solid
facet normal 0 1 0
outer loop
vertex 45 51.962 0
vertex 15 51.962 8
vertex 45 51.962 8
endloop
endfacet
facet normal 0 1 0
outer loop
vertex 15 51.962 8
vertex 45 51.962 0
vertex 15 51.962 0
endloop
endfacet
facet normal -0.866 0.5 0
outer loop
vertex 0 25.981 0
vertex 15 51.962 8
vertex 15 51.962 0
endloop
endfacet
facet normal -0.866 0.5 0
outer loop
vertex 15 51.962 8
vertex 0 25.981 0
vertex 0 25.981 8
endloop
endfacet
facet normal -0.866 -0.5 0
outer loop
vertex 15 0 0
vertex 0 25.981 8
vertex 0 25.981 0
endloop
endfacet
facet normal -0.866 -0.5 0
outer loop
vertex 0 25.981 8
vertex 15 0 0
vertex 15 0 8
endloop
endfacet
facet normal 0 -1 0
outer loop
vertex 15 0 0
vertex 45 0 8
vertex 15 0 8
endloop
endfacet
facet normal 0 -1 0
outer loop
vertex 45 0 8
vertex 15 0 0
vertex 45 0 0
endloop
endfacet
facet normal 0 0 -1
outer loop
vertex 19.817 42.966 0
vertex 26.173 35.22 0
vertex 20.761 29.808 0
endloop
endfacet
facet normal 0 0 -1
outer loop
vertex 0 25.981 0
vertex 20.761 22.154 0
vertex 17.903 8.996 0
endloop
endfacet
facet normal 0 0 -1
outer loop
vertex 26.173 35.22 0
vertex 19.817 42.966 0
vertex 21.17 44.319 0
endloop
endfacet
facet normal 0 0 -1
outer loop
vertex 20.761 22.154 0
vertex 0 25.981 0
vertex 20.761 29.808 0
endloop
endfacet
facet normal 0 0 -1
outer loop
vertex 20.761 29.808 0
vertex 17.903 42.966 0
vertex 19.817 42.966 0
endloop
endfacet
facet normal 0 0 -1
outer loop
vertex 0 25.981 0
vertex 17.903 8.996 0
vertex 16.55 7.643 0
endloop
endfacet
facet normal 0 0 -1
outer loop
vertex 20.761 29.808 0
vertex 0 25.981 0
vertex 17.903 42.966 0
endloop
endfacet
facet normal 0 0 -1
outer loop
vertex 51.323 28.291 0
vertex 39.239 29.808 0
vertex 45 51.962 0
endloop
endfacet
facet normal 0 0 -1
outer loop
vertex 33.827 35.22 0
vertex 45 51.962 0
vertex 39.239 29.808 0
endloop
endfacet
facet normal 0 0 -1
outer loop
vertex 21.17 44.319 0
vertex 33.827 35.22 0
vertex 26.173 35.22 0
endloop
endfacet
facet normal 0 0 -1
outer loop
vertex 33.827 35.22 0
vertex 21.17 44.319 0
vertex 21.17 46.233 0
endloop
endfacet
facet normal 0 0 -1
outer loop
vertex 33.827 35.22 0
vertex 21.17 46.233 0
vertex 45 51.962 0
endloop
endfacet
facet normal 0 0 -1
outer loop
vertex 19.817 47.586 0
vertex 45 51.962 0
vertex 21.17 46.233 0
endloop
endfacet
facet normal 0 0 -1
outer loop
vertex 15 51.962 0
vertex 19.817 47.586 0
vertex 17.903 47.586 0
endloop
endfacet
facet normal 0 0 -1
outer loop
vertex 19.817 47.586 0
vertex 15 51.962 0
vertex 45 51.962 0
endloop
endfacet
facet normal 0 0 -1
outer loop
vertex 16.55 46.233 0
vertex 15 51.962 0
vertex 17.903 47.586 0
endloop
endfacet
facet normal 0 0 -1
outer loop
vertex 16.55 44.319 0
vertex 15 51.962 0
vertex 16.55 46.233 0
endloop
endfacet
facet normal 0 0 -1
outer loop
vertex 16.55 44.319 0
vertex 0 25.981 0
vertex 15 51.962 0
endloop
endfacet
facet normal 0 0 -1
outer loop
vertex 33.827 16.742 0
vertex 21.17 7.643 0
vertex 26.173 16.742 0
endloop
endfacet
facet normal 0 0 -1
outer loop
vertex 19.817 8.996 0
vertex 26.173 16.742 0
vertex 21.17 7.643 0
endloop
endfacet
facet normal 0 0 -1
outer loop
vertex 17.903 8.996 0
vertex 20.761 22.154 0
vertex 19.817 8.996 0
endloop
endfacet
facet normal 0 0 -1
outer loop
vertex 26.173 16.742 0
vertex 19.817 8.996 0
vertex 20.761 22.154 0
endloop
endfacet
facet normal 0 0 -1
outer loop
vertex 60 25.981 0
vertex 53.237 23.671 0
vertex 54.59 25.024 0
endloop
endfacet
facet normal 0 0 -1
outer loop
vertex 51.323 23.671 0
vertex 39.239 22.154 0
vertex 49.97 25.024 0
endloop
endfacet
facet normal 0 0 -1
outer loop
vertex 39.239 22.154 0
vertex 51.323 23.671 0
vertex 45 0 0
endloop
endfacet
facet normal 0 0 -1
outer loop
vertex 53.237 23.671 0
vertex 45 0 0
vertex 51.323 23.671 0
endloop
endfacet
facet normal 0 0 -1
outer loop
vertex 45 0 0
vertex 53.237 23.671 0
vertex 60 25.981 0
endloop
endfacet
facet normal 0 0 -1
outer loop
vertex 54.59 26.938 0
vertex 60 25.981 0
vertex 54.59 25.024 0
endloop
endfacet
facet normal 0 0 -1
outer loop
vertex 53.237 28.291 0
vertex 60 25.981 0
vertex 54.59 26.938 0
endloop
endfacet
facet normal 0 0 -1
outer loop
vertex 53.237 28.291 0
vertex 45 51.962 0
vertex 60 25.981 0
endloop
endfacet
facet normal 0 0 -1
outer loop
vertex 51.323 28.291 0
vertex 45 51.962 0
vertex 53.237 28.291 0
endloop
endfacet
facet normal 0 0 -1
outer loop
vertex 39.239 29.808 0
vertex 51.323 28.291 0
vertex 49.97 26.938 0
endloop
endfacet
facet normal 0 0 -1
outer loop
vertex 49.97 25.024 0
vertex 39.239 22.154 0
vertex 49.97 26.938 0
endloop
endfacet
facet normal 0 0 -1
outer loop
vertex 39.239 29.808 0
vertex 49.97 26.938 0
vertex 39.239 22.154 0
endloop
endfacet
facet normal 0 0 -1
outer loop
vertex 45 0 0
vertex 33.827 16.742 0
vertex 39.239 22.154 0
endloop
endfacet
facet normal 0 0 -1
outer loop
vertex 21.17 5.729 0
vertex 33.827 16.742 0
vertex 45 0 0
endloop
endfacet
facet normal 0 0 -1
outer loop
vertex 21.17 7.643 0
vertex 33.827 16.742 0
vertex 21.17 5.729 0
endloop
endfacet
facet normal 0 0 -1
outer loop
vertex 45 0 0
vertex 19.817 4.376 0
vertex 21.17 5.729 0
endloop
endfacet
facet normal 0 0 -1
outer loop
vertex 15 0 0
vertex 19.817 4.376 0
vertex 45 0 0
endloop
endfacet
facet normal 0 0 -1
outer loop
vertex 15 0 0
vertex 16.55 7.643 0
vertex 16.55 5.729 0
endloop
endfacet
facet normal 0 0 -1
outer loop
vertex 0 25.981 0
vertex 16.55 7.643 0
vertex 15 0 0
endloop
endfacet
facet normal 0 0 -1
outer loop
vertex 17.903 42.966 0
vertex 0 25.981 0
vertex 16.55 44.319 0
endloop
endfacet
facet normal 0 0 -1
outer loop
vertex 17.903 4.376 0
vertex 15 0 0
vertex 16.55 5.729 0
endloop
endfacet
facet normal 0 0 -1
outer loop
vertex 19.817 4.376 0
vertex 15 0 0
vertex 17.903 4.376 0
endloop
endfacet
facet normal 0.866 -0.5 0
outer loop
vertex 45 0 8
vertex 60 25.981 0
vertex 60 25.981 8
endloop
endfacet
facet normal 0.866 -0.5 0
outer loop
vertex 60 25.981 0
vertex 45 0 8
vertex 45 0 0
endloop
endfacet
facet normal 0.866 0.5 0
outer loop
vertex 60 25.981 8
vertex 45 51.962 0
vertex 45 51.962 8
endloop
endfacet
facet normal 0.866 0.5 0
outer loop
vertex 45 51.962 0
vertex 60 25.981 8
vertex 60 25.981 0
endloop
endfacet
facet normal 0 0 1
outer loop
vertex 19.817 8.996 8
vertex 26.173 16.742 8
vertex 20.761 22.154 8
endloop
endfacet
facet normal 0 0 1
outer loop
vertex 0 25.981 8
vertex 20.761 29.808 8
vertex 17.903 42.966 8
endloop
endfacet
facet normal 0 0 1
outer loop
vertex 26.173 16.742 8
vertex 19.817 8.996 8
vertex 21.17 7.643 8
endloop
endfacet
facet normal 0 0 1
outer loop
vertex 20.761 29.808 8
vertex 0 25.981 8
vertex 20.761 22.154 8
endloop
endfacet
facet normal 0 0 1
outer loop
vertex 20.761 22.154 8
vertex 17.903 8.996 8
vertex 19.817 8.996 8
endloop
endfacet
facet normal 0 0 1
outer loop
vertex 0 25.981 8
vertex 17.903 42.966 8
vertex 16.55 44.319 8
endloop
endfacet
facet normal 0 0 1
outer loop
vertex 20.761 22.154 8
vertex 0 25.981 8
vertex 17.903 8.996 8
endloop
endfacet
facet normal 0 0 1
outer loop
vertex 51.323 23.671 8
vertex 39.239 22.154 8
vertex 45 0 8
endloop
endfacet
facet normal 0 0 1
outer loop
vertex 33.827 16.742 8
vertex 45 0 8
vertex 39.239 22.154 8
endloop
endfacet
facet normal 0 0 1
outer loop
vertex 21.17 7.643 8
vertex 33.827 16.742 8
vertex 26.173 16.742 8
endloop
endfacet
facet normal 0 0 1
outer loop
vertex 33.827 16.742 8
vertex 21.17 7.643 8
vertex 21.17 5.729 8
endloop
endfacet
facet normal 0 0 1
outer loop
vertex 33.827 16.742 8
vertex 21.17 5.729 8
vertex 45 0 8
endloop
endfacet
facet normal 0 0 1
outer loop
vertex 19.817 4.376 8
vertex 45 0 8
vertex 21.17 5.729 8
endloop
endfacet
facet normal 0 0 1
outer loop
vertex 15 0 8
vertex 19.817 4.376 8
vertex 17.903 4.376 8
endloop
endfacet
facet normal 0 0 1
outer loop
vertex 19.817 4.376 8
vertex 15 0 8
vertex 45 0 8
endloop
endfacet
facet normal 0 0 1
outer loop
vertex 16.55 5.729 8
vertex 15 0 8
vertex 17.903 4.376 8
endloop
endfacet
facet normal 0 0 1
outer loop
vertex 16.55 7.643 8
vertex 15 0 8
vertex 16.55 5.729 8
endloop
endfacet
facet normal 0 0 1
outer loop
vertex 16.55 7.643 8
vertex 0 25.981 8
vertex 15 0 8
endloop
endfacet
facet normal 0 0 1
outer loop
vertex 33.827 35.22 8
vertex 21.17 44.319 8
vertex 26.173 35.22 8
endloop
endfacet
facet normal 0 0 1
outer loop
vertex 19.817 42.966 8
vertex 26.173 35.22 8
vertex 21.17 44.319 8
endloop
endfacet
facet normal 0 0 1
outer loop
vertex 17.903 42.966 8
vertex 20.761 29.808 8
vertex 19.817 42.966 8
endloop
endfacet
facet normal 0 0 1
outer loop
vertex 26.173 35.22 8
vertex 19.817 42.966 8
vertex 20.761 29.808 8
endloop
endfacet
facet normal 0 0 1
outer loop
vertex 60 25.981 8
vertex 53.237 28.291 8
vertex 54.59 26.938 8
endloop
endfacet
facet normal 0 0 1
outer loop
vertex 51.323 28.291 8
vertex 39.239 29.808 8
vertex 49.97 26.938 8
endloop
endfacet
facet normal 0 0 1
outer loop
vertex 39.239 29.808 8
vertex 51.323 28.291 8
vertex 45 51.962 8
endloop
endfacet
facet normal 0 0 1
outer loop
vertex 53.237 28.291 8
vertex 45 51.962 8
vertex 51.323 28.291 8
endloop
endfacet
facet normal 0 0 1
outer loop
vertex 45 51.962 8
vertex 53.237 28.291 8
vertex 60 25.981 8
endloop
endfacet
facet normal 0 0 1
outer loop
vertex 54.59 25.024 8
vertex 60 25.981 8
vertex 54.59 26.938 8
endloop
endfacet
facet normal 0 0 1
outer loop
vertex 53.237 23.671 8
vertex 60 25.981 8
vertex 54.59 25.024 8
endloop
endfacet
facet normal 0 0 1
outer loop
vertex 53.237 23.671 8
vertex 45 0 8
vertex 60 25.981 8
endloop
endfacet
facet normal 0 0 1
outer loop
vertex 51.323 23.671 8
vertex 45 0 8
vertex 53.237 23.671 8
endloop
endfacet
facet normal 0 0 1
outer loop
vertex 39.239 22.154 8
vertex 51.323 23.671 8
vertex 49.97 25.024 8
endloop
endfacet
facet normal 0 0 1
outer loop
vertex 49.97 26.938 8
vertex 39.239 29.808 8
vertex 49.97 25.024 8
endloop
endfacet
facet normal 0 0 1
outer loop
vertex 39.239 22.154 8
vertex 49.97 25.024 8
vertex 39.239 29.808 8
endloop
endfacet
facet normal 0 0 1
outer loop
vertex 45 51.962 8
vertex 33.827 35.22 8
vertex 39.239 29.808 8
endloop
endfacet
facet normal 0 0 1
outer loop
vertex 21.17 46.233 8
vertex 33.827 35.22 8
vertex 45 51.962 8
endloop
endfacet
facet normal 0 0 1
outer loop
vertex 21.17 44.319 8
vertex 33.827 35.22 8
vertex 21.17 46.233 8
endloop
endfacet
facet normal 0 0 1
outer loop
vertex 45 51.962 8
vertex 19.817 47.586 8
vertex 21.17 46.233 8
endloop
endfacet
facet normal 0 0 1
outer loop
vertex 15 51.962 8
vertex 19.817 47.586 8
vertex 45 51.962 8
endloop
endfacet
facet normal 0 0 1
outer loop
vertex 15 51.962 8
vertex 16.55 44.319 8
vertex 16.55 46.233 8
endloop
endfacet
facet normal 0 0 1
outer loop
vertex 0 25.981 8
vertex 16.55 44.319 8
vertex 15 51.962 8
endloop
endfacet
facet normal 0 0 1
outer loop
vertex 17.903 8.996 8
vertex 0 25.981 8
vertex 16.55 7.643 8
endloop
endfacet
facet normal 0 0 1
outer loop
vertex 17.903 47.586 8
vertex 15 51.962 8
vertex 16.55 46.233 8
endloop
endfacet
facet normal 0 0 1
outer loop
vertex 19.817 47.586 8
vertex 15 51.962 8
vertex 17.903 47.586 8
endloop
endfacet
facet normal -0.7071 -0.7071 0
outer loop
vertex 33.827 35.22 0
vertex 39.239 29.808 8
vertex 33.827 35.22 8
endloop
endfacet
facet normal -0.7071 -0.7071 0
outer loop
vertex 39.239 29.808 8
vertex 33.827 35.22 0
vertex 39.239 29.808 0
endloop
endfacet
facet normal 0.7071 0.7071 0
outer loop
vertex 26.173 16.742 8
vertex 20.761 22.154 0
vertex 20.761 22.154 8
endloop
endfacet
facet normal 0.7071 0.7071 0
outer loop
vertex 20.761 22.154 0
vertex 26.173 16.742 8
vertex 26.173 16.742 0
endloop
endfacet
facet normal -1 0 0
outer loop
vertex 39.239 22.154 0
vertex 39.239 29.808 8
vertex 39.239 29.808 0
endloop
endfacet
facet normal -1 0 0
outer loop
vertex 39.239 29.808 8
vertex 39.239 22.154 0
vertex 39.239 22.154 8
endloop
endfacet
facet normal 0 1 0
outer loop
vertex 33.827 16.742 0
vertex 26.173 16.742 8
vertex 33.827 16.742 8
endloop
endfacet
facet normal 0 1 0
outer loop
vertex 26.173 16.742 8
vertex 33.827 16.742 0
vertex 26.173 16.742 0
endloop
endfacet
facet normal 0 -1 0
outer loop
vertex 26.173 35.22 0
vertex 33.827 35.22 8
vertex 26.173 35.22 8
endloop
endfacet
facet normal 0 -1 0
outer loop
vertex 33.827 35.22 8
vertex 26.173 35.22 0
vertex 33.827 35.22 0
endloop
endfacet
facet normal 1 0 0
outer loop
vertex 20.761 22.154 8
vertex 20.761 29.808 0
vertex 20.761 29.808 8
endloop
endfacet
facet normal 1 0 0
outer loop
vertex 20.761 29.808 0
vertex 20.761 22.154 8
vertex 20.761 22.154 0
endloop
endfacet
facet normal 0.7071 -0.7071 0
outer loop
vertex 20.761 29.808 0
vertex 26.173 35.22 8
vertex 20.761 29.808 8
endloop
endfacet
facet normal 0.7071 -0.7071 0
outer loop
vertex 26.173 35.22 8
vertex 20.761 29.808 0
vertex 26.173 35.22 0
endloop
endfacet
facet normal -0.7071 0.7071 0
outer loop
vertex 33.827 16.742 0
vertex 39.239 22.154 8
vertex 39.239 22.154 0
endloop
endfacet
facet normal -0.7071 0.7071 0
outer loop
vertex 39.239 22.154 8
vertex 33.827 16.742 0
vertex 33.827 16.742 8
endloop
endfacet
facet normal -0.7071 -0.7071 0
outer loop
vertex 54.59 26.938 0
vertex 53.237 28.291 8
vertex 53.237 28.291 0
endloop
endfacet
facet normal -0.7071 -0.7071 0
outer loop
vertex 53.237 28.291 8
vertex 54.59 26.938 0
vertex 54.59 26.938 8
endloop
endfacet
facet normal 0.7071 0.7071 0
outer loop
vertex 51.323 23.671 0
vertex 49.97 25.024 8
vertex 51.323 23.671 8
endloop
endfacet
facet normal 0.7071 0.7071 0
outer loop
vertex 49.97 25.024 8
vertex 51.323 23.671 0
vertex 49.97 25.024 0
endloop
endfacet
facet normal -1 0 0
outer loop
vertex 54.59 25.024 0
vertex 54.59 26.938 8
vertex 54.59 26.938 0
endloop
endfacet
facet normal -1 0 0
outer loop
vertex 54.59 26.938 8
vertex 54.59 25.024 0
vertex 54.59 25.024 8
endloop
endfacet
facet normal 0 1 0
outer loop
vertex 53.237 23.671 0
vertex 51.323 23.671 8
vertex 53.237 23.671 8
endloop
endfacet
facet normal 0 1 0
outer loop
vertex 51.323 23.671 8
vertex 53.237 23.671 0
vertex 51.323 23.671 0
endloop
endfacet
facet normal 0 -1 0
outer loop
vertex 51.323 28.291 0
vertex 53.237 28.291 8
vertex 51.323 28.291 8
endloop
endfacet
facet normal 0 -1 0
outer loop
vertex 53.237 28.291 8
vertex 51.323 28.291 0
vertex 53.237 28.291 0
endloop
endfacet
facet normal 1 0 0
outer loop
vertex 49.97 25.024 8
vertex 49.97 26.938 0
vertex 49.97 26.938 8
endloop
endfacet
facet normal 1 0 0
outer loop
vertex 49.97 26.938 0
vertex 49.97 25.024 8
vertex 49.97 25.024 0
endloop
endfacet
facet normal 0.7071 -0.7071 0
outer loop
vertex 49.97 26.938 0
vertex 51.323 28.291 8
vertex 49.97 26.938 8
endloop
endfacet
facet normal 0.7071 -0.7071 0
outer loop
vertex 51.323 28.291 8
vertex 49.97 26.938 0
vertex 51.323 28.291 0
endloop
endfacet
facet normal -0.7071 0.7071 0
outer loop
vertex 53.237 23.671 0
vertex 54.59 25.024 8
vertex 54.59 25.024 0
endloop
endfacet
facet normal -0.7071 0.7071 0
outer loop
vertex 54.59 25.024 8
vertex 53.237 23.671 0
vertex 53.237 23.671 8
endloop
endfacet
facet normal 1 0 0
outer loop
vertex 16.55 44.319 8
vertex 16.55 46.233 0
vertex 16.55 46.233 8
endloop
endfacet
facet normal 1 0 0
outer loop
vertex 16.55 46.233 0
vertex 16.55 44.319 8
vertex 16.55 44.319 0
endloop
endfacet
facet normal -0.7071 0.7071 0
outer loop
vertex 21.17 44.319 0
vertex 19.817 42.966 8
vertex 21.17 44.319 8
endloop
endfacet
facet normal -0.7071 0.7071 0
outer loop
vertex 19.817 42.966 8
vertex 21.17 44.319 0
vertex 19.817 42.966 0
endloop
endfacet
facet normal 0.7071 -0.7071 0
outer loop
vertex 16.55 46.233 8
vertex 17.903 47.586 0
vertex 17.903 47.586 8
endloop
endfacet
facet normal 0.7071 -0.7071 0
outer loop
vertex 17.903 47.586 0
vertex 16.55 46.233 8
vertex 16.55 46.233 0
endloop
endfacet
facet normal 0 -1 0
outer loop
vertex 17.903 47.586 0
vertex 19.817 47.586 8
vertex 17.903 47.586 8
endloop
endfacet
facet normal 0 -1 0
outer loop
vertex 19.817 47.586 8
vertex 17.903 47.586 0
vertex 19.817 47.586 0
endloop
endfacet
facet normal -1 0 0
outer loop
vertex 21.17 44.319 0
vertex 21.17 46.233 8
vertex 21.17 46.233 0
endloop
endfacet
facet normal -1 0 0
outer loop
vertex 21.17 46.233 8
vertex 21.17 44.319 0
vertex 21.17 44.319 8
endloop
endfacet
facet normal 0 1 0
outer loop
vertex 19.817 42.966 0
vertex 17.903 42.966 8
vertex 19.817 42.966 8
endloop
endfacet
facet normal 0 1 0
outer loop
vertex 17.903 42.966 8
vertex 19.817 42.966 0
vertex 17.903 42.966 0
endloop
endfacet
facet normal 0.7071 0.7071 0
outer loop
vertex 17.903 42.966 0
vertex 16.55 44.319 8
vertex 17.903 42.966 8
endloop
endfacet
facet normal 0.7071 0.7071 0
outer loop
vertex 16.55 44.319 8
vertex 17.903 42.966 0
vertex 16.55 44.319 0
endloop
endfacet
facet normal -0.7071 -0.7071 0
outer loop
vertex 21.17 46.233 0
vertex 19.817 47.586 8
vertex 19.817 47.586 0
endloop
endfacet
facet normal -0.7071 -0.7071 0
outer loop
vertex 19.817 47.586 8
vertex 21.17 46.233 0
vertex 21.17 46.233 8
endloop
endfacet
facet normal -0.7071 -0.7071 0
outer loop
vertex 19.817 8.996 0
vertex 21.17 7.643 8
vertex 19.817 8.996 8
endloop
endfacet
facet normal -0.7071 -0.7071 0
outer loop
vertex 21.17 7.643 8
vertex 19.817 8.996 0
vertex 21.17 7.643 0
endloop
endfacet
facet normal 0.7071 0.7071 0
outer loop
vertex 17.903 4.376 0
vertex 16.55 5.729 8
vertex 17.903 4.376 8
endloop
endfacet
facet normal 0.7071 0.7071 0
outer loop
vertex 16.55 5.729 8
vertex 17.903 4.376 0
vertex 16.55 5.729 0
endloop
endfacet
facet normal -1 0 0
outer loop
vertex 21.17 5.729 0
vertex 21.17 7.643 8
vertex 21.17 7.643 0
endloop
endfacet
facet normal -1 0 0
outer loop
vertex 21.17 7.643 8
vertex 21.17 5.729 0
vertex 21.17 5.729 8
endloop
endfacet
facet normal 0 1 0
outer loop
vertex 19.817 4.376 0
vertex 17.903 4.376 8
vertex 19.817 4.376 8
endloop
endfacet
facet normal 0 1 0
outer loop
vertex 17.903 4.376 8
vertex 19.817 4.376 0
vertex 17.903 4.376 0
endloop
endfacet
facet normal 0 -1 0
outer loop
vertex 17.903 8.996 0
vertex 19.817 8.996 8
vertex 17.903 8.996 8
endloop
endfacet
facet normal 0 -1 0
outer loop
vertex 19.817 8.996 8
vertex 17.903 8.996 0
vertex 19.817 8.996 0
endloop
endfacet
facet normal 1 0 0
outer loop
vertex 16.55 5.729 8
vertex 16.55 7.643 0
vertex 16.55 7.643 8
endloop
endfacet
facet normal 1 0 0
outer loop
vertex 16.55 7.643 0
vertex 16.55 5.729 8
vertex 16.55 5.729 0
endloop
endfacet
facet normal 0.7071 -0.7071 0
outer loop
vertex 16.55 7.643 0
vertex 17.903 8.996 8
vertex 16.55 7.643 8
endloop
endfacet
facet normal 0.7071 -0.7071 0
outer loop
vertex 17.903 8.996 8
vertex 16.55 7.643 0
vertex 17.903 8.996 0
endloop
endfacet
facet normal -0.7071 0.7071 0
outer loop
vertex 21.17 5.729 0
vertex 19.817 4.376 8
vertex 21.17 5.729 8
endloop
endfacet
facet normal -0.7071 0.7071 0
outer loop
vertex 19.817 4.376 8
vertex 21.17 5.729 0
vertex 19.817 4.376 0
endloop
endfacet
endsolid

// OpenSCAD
$fn = 32;

// ----------------------------------------------------------------------
// Polygon plate: 6-gon R30, 3 bolt windows
// ----------------------------------------------------------------------

// --- parameters (mm) ---
sides = 6;                // number of polygon sides
plate_r = 30;             // circumscribed radius of the polygon
bore_r = 10;              // centre bore radius
bolts = 3;                // number of bolt windows
ring_r = 22.28;           // bolt-circle radius
bolt_r = 2.5;             // bolt window radius
plate_t = 8;              // plate thickness, Z (extrusion height)

plate_d = 2 * plate_r;  // circumscribed diameter
bore_d = 2 * bore_r;  // centre bore diameter
bolt_d = 2 * bolt_r;  // bolt window diameter
ring_d = 2 * ring_r;  // bolt-circle diameter

profile = [[60, 25.981], [45, 51.962], [15, 51.962], [0, 25.981], [15, 0], [45, 0]];  // primary outline, 6 points, counter clockwise
void_1 = [[39.239, 29.808], [33.827, 35.22], [26.173, 35.22], [20.761, 29.808], [20.761, 22.154], [26.173, 16.742], [33.827, 16.742], [39.239, 22.154]];  // centre bore, 8 points
void_2 = [[54.59, 26.938], [53.237, 28.291], [51.323, 28.291], [49.97, 26.938], [49.97, 25.024], [51.323, 23.671], [53.237, 23.671], [54.59, 25.024]];  // bolt window 1, 8 points
void_3 = [[21.17, 46.233], [19.817, 47.586], [17.903, 47.586], [16.55, 46.233], [16.55, 44.319], [17.903, 42.966], [19.817, 42.966], [21.17, 44.319]];  // bolt window 2, 8 points
void_4 = [[21.17, 7.643], [19.817, 8.996], [17.903, 8.996], [16.55, 7.643], [16.55, 5.729], [17.903, 4.376], [19.817, 4.376], [21.17, 5.729]];  // bolt window 3, 8 points

// --- the one profile operation ---
difference() {
  linear_extrude(height = plate_t) polygon(points = profile);
  translate([0, 0, -1])
    linear_extrude(height = plate_t + 2) polygon(points = void_1);
  translate([0, 0, -1])
    linear_extrude(height = plate_t + 2) polygon(points = void_2);
  translate([0, 0, -1])
    linear_extrude(height = plate_t + 2) polygon(points = void_3);
  translate([0, 0, -1])
    linear_extrude(height = plate_t + 2) polygon(points = void_4);
}
